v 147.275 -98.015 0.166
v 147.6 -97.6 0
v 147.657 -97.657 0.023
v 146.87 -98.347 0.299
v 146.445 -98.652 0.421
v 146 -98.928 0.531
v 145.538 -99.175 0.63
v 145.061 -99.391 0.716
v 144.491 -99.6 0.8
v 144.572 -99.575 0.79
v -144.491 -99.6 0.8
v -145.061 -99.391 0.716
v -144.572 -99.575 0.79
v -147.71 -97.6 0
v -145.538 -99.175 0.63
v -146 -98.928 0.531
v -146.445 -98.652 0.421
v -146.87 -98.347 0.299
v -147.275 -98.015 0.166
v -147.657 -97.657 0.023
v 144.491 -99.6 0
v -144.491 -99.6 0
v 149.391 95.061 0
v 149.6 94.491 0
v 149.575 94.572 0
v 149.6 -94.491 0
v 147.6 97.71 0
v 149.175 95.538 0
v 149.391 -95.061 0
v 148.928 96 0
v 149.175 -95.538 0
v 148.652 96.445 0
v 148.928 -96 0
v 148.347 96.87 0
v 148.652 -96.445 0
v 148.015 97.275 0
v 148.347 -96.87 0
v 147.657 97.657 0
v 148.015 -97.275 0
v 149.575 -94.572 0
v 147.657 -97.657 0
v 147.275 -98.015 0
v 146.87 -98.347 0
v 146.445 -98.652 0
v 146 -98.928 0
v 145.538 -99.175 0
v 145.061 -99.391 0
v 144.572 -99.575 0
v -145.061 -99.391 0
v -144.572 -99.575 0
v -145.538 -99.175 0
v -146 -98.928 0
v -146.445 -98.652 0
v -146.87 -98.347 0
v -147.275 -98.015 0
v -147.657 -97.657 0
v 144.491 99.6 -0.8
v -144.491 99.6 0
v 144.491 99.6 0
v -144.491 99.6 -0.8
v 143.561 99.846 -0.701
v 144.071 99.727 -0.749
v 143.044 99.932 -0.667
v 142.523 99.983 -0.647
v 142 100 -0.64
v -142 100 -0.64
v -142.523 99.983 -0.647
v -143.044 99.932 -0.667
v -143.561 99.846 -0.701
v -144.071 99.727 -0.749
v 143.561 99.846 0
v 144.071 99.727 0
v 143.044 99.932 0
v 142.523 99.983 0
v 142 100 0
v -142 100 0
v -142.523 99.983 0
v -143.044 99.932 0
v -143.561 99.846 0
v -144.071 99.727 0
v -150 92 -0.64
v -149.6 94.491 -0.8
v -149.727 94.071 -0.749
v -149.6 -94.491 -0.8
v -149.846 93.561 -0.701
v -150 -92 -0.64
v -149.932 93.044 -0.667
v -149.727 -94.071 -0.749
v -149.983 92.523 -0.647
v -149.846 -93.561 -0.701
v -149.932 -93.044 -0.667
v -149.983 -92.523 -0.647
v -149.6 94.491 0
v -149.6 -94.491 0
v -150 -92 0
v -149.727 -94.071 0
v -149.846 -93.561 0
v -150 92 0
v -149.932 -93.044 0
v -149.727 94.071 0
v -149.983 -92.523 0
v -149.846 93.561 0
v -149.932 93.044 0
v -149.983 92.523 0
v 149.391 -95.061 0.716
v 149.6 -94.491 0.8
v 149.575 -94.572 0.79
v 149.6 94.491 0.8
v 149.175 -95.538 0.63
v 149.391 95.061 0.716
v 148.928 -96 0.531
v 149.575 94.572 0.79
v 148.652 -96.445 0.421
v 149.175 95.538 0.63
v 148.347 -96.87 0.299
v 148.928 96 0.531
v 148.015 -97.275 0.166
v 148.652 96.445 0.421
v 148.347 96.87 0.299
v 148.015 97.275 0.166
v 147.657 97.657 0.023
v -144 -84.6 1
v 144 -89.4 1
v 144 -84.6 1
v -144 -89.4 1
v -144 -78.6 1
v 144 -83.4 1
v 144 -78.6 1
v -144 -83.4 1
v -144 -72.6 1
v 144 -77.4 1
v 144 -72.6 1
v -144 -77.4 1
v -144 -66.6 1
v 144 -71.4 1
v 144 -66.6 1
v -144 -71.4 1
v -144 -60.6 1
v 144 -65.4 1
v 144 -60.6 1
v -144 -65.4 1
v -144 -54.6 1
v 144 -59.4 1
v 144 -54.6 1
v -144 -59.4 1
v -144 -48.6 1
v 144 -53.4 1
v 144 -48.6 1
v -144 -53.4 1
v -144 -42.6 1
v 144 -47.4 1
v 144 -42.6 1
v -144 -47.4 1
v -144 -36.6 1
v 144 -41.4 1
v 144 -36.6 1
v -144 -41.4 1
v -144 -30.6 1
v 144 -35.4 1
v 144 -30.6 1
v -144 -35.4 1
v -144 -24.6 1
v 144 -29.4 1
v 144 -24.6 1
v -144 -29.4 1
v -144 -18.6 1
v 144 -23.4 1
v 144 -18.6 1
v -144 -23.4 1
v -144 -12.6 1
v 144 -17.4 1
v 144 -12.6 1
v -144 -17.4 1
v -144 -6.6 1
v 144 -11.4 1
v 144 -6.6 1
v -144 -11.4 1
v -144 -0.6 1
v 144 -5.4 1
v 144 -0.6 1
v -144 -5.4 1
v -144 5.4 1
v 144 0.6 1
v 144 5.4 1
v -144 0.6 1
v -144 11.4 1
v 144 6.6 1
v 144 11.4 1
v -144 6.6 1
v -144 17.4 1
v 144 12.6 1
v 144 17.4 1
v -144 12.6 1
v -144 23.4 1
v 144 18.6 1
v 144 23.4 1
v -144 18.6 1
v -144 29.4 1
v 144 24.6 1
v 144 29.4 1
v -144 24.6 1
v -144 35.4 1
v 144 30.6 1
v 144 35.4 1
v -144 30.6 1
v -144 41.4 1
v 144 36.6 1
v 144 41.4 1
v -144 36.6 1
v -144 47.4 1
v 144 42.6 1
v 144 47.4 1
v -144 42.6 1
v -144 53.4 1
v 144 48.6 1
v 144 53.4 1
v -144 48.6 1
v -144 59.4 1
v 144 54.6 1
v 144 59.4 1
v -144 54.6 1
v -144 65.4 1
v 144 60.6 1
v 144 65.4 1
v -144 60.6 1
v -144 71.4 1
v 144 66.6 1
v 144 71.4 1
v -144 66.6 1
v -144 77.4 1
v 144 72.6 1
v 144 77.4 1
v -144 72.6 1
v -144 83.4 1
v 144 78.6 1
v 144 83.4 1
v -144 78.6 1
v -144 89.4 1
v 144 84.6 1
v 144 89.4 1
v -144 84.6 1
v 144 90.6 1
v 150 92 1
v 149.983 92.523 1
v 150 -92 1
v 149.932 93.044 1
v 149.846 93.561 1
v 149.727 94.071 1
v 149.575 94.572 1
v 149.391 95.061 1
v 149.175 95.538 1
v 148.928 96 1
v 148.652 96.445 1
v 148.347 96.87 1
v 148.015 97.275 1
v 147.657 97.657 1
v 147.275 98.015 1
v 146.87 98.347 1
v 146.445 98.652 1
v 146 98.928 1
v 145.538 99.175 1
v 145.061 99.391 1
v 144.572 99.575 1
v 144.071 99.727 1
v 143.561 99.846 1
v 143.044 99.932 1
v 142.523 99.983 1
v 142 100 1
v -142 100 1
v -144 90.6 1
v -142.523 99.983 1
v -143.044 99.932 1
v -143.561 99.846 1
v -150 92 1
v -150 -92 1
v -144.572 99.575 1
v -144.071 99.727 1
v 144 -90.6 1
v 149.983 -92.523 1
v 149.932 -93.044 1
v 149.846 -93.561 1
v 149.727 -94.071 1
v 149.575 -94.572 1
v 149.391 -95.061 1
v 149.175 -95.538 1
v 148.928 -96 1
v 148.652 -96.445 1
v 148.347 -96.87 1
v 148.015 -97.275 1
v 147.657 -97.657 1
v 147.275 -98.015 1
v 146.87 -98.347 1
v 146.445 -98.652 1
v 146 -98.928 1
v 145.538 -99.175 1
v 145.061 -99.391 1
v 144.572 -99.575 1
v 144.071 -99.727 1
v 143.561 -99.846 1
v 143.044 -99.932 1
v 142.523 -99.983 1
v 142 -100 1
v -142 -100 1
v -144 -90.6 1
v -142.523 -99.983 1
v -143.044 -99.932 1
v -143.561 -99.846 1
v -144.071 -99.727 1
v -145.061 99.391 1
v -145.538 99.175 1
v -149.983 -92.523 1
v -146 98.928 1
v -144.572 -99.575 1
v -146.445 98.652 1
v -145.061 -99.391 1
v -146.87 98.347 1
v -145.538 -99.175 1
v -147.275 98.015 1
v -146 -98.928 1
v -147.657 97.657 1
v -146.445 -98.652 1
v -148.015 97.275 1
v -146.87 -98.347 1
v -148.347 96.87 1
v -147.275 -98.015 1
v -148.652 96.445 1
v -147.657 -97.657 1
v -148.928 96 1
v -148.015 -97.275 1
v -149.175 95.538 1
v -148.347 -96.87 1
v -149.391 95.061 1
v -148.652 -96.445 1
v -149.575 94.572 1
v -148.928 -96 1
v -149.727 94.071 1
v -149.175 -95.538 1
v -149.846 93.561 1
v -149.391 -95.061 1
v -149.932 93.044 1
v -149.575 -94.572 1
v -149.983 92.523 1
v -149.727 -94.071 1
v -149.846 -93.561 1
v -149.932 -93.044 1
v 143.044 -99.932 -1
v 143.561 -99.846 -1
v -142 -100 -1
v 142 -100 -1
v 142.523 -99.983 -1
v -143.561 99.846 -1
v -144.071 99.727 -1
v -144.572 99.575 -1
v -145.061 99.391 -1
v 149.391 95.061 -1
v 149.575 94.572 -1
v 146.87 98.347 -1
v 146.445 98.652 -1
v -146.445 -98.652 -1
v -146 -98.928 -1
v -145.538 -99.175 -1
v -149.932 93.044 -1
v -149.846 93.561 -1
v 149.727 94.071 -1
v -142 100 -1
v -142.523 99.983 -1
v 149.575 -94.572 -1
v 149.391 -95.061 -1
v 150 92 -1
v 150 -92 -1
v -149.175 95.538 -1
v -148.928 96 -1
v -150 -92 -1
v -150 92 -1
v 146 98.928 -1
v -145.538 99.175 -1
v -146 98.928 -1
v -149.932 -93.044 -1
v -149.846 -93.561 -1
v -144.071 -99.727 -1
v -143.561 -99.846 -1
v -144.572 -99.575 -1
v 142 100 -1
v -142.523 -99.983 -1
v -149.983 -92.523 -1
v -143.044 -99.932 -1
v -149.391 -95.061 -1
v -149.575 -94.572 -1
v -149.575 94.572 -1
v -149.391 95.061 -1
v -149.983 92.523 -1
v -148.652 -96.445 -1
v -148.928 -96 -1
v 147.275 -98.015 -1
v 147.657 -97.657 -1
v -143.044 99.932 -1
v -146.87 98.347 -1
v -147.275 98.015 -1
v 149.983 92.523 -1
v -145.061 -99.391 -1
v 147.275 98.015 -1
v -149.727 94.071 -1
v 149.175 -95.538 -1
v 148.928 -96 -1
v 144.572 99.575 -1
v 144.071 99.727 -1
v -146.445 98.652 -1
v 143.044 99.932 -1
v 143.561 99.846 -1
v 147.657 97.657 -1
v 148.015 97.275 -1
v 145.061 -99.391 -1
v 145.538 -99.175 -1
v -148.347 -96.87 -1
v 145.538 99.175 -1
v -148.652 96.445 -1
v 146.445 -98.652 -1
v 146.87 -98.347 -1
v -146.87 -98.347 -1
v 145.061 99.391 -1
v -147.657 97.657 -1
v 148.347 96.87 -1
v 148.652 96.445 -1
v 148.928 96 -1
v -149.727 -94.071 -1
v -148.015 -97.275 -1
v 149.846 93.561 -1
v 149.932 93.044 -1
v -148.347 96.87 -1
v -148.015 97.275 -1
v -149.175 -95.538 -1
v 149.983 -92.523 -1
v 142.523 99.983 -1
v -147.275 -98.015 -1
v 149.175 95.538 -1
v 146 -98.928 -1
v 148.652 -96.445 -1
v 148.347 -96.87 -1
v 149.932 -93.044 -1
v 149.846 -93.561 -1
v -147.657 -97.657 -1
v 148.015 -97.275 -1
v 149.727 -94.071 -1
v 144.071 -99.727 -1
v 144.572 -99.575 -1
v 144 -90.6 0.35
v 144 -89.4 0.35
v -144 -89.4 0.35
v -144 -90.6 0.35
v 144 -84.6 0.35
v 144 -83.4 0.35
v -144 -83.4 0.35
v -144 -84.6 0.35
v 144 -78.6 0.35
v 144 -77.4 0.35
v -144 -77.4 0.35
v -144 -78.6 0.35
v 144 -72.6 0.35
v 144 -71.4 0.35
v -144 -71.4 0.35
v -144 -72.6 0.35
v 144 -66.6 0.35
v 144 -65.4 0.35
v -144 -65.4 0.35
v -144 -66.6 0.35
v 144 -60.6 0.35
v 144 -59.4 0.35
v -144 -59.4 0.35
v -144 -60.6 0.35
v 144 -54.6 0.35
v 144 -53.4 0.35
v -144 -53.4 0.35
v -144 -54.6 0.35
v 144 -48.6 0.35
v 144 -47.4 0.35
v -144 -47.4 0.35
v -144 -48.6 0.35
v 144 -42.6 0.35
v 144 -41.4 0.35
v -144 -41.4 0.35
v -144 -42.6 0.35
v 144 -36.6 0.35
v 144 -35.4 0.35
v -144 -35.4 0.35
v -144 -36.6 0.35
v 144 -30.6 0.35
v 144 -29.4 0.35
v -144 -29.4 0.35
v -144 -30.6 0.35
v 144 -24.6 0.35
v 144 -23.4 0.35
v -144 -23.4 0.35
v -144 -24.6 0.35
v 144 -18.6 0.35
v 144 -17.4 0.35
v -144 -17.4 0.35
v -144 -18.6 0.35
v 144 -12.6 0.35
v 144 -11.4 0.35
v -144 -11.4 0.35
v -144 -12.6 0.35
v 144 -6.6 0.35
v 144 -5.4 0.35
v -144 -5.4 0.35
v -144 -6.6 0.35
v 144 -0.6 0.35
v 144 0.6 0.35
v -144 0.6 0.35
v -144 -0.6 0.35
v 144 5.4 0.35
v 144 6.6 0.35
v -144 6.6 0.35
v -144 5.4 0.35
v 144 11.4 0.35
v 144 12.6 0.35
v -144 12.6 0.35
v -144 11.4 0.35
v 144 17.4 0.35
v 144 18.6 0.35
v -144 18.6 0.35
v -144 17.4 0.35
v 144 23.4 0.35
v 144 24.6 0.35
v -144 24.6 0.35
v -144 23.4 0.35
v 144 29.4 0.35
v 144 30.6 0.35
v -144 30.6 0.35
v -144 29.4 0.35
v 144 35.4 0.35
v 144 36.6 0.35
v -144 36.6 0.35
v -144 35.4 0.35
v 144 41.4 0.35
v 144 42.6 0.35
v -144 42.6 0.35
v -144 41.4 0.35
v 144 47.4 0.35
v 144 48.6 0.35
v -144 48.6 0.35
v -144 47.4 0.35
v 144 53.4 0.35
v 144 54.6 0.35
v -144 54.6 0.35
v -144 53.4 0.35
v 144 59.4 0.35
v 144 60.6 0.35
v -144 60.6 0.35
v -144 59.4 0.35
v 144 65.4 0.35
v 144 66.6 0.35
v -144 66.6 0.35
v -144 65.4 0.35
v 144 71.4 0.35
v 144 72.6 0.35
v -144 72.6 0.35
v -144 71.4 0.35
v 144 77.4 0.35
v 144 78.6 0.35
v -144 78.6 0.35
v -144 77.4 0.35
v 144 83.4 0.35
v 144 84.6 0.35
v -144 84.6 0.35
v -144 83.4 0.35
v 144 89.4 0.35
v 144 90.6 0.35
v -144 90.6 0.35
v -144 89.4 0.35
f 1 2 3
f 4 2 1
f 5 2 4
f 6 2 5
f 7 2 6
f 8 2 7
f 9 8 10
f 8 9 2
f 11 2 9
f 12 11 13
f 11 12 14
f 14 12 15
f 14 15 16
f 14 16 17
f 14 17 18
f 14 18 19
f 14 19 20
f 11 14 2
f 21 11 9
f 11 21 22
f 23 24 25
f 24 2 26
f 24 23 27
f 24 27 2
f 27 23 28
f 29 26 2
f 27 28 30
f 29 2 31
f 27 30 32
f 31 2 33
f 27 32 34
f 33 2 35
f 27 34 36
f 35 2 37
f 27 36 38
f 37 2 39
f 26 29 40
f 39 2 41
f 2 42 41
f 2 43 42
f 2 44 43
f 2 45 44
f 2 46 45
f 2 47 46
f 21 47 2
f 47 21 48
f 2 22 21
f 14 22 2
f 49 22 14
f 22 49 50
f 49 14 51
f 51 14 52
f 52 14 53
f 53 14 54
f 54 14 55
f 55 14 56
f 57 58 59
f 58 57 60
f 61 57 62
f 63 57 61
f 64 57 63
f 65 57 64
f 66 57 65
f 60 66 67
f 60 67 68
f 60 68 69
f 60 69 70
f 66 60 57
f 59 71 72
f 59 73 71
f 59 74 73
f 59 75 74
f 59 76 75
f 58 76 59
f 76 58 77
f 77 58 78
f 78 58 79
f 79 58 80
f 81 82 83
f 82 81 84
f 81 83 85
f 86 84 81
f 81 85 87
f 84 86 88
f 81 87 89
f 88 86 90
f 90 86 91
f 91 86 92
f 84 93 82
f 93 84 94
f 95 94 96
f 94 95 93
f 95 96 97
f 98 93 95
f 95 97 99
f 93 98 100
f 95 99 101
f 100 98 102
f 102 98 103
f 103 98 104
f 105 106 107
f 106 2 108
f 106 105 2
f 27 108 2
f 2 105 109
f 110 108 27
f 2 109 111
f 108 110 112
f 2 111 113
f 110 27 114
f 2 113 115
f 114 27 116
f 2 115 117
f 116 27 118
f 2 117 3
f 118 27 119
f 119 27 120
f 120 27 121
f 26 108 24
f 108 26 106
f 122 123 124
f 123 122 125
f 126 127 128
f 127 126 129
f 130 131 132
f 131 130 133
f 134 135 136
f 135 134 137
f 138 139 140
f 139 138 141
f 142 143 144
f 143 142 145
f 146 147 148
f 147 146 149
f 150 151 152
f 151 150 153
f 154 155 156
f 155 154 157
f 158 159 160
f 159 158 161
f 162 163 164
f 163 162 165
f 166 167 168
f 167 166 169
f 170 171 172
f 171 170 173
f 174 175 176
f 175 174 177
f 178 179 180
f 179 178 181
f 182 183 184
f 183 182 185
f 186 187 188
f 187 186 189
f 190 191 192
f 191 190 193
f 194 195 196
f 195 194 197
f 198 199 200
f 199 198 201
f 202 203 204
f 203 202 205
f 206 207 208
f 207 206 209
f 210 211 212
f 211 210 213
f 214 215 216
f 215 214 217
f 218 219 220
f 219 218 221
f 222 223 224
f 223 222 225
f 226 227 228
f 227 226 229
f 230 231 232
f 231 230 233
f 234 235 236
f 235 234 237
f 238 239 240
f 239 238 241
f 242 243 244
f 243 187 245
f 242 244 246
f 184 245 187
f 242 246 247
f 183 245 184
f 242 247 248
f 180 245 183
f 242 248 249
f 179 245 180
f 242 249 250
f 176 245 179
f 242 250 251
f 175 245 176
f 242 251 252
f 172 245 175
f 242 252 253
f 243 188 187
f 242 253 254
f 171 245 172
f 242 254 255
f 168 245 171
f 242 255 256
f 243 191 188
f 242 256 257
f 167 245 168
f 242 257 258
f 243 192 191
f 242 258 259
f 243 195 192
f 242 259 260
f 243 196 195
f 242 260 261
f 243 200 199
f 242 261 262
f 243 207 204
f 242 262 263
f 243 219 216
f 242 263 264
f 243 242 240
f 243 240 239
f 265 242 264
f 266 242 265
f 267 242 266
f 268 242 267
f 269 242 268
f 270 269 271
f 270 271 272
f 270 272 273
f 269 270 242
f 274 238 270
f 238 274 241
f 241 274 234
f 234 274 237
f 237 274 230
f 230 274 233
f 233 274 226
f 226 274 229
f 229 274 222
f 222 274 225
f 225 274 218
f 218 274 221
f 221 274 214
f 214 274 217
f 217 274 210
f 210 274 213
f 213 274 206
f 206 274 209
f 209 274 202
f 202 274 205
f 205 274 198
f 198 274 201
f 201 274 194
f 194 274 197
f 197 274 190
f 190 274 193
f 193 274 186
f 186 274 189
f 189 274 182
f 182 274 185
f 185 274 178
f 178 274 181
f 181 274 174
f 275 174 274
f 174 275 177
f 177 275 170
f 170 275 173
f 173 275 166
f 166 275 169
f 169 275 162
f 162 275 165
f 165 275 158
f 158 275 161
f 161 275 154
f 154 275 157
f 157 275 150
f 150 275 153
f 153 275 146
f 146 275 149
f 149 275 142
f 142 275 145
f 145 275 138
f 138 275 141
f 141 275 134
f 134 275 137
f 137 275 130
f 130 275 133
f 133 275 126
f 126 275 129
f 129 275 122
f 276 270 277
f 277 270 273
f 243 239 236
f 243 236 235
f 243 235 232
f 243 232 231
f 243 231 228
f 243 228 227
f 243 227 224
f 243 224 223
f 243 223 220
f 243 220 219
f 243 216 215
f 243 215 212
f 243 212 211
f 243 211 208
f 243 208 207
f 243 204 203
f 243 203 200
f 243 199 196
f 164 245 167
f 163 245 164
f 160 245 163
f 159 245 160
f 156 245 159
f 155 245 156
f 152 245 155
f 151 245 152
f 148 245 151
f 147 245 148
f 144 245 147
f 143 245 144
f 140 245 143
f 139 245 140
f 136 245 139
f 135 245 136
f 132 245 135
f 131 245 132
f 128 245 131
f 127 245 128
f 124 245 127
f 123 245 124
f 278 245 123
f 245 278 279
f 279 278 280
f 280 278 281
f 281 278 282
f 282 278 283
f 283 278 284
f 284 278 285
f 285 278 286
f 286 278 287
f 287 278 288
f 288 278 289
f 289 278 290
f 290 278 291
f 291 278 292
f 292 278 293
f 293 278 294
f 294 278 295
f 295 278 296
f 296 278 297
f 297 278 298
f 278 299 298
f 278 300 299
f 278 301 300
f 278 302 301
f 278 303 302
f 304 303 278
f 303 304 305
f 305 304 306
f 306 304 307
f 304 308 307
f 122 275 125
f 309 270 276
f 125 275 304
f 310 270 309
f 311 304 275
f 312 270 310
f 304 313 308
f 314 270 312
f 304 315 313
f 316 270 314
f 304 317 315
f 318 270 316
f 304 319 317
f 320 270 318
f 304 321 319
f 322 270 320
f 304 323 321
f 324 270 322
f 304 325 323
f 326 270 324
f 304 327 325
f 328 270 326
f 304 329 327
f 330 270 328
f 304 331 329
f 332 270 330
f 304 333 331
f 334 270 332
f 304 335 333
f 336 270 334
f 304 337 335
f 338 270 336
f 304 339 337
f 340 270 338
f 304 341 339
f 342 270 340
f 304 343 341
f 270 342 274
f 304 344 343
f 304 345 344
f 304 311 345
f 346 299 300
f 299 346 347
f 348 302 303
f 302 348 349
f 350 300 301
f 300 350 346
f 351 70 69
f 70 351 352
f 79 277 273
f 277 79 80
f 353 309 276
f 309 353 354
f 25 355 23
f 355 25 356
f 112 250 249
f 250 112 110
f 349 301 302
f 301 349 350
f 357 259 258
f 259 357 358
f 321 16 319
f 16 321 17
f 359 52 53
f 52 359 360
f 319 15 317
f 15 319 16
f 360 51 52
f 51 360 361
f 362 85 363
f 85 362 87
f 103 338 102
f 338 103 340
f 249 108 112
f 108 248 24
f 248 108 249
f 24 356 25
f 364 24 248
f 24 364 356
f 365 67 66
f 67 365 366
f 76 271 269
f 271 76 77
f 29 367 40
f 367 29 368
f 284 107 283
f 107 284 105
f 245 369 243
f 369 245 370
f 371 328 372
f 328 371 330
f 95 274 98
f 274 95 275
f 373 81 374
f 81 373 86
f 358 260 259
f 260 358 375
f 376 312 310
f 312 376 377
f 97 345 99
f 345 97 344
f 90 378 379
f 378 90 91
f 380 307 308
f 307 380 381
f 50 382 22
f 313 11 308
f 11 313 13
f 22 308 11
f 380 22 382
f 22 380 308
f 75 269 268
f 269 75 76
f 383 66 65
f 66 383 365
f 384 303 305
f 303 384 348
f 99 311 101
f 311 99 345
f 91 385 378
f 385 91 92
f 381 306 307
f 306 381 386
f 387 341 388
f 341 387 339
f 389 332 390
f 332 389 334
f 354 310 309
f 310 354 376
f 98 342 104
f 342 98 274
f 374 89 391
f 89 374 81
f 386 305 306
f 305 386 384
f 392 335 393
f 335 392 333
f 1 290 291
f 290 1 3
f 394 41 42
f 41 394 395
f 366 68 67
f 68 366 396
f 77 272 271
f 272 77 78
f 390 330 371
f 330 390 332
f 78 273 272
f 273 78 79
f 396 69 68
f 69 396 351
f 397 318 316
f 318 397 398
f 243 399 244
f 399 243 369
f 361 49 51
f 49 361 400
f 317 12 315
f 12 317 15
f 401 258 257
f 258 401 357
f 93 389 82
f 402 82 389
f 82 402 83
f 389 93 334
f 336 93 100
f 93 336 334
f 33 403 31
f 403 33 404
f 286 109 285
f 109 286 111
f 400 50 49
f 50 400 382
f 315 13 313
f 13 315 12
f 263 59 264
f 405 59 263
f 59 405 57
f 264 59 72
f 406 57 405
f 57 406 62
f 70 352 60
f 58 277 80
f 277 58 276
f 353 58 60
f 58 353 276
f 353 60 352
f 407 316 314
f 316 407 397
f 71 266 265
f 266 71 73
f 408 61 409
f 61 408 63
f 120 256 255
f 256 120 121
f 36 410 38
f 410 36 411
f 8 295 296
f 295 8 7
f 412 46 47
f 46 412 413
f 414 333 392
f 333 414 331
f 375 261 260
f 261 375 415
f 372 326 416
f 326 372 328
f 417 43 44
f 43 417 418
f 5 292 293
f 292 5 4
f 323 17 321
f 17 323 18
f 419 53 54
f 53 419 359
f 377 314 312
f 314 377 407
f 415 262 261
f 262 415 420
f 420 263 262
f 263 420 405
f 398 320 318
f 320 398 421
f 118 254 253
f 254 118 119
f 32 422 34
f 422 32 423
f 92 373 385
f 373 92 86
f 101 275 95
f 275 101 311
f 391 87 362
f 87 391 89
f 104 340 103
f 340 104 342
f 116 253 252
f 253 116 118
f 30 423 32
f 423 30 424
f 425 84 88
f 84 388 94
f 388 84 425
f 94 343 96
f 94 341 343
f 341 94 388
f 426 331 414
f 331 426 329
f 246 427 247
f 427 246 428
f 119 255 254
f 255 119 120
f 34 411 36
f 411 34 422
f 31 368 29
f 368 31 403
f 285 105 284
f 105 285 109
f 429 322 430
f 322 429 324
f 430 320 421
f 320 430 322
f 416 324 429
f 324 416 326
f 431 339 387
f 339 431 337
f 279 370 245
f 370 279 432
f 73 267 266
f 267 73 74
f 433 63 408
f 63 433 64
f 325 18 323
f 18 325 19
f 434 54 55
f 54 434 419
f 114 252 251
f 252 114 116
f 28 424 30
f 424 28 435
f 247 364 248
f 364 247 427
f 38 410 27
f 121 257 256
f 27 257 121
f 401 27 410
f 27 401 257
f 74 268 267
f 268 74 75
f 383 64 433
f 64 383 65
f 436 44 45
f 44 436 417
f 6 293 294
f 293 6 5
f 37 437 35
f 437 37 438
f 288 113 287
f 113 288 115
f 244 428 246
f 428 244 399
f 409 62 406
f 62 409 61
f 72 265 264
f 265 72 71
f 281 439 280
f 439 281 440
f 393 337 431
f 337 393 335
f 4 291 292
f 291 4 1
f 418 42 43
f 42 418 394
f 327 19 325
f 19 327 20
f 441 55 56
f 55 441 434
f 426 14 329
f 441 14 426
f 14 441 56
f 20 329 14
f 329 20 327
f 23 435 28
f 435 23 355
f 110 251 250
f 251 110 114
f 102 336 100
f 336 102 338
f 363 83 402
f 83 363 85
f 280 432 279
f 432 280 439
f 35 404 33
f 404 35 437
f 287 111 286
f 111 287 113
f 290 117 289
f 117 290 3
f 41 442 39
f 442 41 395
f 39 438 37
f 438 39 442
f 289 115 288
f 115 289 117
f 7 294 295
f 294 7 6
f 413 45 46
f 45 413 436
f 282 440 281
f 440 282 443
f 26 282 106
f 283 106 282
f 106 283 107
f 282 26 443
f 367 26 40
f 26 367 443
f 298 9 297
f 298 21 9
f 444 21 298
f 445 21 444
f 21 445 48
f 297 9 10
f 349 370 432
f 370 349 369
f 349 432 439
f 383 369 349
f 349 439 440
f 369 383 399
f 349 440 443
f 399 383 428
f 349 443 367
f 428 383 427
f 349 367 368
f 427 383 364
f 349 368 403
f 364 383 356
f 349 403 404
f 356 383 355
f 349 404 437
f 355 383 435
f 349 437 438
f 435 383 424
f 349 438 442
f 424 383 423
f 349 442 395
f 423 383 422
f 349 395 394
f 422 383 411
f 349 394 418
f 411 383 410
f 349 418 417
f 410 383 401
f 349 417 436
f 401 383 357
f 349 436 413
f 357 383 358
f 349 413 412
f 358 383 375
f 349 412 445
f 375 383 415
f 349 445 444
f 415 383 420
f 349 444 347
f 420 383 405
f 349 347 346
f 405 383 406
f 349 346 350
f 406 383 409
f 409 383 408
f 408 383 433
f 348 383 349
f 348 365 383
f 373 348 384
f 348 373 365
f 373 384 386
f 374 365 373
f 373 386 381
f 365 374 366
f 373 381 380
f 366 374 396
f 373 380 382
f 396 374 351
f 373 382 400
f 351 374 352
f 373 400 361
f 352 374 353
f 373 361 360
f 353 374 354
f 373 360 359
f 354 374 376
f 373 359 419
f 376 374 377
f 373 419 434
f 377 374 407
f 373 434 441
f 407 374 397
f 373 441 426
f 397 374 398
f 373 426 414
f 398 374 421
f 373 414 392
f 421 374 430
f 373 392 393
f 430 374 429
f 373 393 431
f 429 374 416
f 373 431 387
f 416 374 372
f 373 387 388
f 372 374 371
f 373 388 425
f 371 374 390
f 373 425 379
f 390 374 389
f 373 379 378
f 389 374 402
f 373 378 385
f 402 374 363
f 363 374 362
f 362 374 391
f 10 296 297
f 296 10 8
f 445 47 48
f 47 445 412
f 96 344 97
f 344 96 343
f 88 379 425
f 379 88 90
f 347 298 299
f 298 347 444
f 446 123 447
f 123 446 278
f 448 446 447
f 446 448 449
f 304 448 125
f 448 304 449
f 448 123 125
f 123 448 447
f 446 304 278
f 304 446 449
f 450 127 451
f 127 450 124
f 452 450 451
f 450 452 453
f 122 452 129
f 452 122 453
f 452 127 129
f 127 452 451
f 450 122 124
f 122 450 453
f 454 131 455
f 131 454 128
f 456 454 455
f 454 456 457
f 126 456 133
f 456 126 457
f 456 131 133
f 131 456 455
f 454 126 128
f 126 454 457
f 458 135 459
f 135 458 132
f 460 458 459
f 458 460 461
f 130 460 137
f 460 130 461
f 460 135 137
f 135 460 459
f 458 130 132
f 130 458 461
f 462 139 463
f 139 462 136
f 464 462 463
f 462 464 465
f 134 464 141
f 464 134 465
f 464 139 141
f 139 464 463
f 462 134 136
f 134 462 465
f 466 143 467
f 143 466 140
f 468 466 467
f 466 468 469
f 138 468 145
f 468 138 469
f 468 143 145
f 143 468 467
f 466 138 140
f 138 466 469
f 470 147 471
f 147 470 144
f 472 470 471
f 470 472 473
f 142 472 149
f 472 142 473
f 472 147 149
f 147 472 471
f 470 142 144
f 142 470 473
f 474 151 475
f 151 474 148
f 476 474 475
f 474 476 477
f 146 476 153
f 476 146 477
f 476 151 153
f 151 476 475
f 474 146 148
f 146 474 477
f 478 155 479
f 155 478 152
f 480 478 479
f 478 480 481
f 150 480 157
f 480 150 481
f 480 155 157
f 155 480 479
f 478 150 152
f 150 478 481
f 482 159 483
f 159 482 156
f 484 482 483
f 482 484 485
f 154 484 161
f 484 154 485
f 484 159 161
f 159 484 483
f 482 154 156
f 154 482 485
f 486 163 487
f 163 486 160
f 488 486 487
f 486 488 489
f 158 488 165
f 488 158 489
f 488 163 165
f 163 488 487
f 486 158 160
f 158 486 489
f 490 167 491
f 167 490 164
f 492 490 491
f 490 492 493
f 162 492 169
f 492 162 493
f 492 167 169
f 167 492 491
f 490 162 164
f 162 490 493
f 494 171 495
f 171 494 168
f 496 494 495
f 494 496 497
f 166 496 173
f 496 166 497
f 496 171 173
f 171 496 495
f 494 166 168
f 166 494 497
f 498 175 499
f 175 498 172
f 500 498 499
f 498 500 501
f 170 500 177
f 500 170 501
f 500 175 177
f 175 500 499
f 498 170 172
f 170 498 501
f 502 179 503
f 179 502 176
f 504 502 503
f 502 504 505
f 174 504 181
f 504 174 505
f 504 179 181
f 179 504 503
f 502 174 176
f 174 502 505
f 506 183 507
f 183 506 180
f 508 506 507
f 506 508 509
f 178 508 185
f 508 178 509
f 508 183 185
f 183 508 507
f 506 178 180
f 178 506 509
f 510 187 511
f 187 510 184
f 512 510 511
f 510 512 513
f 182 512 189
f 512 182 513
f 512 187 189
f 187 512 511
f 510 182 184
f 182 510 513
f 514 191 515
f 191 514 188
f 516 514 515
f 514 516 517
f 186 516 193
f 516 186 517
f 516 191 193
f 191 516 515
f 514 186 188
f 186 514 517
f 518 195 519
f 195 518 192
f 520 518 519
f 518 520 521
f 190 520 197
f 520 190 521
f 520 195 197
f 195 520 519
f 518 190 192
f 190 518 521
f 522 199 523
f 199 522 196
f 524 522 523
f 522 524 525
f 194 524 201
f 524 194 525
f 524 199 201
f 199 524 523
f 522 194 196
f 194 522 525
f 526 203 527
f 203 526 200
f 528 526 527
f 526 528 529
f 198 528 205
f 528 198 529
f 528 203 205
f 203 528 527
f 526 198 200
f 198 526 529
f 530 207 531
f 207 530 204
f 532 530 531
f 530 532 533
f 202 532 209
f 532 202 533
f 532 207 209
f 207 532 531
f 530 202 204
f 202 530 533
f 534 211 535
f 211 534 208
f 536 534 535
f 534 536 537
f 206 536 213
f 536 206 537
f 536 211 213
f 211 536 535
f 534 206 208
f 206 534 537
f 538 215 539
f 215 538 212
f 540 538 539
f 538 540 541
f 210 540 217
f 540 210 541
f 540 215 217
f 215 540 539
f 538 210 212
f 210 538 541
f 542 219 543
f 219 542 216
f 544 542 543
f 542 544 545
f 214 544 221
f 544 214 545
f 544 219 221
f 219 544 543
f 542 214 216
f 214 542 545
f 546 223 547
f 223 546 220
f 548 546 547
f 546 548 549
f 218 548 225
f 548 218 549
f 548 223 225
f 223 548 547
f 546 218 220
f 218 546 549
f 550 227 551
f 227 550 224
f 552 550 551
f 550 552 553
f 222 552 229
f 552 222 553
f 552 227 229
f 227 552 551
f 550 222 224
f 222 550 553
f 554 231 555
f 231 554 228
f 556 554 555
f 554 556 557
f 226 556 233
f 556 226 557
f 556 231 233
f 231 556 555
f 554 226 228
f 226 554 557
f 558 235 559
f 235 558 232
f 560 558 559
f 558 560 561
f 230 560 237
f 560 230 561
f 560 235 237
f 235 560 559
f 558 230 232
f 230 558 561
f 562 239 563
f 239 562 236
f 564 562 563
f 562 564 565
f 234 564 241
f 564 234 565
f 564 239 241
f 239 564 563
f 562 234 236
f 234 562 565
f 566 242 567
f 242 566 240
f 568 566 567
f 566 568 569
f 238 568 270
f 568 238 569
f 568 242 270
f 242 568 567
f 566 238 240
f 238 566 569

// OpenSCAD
// Parameters
sheet_length = 300; //[150:600:1]
sheet_width = 200;  //[100:400:1]
sheet_thickness = 2; //[1:6:0.5]
corner_radius = 8;  //[2:20:1]
edge_chamfer = 0.8; //[0.2:3:0.1]
texture_depth = 0.15; //[0.05:0.4:0.01]
texture_pitch = 6;  //[3:12:0.5]
texture_groove_width = 1.2; //[0.5:3:0.1]
texture_margin = 6; //[0:20:1]
overlap = 1;        //[0.5:2:0.1]

$fn = 96;

// Helpers
function clamp(v, lo, hi) = v < lo ? lo : (v > hi ? hi : v);

// Rounded rectangle sheet (single connected solid)
module rounded_sheet(L, W, T, R) {
  R2 = clamp(R, 0, min(L, W)/2 - 0.01);
  linear_extrude(height=T, center=true, convexity=10)
    offset(r=R2)
      square([L - 2*R2, W - 2*R2], center=true);
}

// Chamfer by subtracting wedges along all 4 edges (keeps solid connected)
module chamfered_sheet(L, W, T, R, C) {
  C2 = clamp(C, 0, T/2 - 0.001);
  difference() {
    rounded_sheet(L, W, T, R);

    // Long edges (along X)
    for (sy = [-1, 1]) {
      translate([0, sy*(W/2 - C2/2), 0])
        rotate([0, sy*90, 0])
          linear_extrude(height=L + 2*overlap, center=true, convexity=10)
            polygon(points=[[0,0],[C2,0],[0,T]]);
    }

    // Short edges (along Y)
    for (sx = [-1, 1]) {
      translate([sx*(L/2 - C2/2), 0, 0])
        rotate([0, -sx*90, 90])
          linear_extrude(height=W + 2*overlap, center=true, convexity=10)
            polygon(points=[[0,0],[C2,0],[0,T]]);
    }
  }
}

// Surface texture grooves (subtractive, shallow)
module texture_grooves(L, W, T) {
  usable_w = W - 2*texture_margin;
  usable_l = L - 2*texture_margin;
  if (usable_w > 0 && usable_l > 0) {
    n = floor(usable_w / texture_pitch);
    for (k = [-n:n]) {
      y = k * texture_pitch;
      if (abs(y) <= usable_w/2 - texture_groove_width/2) {
        translate([0, y, T/2 - texture_depth/2])
          cube([usable_l, texture_groove_width, texture_depth + overlap], center=true);
      }
    }
  }
}

// Final sheet
module final_sheet() {
  difference() {
    chamfered_sheet(sheet_length, sheet_width, sheet_thickness, corner_radius, edge_chamfer);
    texture_grooves(sheet_length, sheet_width, sheet_thickness);
  }
}

// Render
color([0.08, 0.08, 0.09])
final_sheet();
